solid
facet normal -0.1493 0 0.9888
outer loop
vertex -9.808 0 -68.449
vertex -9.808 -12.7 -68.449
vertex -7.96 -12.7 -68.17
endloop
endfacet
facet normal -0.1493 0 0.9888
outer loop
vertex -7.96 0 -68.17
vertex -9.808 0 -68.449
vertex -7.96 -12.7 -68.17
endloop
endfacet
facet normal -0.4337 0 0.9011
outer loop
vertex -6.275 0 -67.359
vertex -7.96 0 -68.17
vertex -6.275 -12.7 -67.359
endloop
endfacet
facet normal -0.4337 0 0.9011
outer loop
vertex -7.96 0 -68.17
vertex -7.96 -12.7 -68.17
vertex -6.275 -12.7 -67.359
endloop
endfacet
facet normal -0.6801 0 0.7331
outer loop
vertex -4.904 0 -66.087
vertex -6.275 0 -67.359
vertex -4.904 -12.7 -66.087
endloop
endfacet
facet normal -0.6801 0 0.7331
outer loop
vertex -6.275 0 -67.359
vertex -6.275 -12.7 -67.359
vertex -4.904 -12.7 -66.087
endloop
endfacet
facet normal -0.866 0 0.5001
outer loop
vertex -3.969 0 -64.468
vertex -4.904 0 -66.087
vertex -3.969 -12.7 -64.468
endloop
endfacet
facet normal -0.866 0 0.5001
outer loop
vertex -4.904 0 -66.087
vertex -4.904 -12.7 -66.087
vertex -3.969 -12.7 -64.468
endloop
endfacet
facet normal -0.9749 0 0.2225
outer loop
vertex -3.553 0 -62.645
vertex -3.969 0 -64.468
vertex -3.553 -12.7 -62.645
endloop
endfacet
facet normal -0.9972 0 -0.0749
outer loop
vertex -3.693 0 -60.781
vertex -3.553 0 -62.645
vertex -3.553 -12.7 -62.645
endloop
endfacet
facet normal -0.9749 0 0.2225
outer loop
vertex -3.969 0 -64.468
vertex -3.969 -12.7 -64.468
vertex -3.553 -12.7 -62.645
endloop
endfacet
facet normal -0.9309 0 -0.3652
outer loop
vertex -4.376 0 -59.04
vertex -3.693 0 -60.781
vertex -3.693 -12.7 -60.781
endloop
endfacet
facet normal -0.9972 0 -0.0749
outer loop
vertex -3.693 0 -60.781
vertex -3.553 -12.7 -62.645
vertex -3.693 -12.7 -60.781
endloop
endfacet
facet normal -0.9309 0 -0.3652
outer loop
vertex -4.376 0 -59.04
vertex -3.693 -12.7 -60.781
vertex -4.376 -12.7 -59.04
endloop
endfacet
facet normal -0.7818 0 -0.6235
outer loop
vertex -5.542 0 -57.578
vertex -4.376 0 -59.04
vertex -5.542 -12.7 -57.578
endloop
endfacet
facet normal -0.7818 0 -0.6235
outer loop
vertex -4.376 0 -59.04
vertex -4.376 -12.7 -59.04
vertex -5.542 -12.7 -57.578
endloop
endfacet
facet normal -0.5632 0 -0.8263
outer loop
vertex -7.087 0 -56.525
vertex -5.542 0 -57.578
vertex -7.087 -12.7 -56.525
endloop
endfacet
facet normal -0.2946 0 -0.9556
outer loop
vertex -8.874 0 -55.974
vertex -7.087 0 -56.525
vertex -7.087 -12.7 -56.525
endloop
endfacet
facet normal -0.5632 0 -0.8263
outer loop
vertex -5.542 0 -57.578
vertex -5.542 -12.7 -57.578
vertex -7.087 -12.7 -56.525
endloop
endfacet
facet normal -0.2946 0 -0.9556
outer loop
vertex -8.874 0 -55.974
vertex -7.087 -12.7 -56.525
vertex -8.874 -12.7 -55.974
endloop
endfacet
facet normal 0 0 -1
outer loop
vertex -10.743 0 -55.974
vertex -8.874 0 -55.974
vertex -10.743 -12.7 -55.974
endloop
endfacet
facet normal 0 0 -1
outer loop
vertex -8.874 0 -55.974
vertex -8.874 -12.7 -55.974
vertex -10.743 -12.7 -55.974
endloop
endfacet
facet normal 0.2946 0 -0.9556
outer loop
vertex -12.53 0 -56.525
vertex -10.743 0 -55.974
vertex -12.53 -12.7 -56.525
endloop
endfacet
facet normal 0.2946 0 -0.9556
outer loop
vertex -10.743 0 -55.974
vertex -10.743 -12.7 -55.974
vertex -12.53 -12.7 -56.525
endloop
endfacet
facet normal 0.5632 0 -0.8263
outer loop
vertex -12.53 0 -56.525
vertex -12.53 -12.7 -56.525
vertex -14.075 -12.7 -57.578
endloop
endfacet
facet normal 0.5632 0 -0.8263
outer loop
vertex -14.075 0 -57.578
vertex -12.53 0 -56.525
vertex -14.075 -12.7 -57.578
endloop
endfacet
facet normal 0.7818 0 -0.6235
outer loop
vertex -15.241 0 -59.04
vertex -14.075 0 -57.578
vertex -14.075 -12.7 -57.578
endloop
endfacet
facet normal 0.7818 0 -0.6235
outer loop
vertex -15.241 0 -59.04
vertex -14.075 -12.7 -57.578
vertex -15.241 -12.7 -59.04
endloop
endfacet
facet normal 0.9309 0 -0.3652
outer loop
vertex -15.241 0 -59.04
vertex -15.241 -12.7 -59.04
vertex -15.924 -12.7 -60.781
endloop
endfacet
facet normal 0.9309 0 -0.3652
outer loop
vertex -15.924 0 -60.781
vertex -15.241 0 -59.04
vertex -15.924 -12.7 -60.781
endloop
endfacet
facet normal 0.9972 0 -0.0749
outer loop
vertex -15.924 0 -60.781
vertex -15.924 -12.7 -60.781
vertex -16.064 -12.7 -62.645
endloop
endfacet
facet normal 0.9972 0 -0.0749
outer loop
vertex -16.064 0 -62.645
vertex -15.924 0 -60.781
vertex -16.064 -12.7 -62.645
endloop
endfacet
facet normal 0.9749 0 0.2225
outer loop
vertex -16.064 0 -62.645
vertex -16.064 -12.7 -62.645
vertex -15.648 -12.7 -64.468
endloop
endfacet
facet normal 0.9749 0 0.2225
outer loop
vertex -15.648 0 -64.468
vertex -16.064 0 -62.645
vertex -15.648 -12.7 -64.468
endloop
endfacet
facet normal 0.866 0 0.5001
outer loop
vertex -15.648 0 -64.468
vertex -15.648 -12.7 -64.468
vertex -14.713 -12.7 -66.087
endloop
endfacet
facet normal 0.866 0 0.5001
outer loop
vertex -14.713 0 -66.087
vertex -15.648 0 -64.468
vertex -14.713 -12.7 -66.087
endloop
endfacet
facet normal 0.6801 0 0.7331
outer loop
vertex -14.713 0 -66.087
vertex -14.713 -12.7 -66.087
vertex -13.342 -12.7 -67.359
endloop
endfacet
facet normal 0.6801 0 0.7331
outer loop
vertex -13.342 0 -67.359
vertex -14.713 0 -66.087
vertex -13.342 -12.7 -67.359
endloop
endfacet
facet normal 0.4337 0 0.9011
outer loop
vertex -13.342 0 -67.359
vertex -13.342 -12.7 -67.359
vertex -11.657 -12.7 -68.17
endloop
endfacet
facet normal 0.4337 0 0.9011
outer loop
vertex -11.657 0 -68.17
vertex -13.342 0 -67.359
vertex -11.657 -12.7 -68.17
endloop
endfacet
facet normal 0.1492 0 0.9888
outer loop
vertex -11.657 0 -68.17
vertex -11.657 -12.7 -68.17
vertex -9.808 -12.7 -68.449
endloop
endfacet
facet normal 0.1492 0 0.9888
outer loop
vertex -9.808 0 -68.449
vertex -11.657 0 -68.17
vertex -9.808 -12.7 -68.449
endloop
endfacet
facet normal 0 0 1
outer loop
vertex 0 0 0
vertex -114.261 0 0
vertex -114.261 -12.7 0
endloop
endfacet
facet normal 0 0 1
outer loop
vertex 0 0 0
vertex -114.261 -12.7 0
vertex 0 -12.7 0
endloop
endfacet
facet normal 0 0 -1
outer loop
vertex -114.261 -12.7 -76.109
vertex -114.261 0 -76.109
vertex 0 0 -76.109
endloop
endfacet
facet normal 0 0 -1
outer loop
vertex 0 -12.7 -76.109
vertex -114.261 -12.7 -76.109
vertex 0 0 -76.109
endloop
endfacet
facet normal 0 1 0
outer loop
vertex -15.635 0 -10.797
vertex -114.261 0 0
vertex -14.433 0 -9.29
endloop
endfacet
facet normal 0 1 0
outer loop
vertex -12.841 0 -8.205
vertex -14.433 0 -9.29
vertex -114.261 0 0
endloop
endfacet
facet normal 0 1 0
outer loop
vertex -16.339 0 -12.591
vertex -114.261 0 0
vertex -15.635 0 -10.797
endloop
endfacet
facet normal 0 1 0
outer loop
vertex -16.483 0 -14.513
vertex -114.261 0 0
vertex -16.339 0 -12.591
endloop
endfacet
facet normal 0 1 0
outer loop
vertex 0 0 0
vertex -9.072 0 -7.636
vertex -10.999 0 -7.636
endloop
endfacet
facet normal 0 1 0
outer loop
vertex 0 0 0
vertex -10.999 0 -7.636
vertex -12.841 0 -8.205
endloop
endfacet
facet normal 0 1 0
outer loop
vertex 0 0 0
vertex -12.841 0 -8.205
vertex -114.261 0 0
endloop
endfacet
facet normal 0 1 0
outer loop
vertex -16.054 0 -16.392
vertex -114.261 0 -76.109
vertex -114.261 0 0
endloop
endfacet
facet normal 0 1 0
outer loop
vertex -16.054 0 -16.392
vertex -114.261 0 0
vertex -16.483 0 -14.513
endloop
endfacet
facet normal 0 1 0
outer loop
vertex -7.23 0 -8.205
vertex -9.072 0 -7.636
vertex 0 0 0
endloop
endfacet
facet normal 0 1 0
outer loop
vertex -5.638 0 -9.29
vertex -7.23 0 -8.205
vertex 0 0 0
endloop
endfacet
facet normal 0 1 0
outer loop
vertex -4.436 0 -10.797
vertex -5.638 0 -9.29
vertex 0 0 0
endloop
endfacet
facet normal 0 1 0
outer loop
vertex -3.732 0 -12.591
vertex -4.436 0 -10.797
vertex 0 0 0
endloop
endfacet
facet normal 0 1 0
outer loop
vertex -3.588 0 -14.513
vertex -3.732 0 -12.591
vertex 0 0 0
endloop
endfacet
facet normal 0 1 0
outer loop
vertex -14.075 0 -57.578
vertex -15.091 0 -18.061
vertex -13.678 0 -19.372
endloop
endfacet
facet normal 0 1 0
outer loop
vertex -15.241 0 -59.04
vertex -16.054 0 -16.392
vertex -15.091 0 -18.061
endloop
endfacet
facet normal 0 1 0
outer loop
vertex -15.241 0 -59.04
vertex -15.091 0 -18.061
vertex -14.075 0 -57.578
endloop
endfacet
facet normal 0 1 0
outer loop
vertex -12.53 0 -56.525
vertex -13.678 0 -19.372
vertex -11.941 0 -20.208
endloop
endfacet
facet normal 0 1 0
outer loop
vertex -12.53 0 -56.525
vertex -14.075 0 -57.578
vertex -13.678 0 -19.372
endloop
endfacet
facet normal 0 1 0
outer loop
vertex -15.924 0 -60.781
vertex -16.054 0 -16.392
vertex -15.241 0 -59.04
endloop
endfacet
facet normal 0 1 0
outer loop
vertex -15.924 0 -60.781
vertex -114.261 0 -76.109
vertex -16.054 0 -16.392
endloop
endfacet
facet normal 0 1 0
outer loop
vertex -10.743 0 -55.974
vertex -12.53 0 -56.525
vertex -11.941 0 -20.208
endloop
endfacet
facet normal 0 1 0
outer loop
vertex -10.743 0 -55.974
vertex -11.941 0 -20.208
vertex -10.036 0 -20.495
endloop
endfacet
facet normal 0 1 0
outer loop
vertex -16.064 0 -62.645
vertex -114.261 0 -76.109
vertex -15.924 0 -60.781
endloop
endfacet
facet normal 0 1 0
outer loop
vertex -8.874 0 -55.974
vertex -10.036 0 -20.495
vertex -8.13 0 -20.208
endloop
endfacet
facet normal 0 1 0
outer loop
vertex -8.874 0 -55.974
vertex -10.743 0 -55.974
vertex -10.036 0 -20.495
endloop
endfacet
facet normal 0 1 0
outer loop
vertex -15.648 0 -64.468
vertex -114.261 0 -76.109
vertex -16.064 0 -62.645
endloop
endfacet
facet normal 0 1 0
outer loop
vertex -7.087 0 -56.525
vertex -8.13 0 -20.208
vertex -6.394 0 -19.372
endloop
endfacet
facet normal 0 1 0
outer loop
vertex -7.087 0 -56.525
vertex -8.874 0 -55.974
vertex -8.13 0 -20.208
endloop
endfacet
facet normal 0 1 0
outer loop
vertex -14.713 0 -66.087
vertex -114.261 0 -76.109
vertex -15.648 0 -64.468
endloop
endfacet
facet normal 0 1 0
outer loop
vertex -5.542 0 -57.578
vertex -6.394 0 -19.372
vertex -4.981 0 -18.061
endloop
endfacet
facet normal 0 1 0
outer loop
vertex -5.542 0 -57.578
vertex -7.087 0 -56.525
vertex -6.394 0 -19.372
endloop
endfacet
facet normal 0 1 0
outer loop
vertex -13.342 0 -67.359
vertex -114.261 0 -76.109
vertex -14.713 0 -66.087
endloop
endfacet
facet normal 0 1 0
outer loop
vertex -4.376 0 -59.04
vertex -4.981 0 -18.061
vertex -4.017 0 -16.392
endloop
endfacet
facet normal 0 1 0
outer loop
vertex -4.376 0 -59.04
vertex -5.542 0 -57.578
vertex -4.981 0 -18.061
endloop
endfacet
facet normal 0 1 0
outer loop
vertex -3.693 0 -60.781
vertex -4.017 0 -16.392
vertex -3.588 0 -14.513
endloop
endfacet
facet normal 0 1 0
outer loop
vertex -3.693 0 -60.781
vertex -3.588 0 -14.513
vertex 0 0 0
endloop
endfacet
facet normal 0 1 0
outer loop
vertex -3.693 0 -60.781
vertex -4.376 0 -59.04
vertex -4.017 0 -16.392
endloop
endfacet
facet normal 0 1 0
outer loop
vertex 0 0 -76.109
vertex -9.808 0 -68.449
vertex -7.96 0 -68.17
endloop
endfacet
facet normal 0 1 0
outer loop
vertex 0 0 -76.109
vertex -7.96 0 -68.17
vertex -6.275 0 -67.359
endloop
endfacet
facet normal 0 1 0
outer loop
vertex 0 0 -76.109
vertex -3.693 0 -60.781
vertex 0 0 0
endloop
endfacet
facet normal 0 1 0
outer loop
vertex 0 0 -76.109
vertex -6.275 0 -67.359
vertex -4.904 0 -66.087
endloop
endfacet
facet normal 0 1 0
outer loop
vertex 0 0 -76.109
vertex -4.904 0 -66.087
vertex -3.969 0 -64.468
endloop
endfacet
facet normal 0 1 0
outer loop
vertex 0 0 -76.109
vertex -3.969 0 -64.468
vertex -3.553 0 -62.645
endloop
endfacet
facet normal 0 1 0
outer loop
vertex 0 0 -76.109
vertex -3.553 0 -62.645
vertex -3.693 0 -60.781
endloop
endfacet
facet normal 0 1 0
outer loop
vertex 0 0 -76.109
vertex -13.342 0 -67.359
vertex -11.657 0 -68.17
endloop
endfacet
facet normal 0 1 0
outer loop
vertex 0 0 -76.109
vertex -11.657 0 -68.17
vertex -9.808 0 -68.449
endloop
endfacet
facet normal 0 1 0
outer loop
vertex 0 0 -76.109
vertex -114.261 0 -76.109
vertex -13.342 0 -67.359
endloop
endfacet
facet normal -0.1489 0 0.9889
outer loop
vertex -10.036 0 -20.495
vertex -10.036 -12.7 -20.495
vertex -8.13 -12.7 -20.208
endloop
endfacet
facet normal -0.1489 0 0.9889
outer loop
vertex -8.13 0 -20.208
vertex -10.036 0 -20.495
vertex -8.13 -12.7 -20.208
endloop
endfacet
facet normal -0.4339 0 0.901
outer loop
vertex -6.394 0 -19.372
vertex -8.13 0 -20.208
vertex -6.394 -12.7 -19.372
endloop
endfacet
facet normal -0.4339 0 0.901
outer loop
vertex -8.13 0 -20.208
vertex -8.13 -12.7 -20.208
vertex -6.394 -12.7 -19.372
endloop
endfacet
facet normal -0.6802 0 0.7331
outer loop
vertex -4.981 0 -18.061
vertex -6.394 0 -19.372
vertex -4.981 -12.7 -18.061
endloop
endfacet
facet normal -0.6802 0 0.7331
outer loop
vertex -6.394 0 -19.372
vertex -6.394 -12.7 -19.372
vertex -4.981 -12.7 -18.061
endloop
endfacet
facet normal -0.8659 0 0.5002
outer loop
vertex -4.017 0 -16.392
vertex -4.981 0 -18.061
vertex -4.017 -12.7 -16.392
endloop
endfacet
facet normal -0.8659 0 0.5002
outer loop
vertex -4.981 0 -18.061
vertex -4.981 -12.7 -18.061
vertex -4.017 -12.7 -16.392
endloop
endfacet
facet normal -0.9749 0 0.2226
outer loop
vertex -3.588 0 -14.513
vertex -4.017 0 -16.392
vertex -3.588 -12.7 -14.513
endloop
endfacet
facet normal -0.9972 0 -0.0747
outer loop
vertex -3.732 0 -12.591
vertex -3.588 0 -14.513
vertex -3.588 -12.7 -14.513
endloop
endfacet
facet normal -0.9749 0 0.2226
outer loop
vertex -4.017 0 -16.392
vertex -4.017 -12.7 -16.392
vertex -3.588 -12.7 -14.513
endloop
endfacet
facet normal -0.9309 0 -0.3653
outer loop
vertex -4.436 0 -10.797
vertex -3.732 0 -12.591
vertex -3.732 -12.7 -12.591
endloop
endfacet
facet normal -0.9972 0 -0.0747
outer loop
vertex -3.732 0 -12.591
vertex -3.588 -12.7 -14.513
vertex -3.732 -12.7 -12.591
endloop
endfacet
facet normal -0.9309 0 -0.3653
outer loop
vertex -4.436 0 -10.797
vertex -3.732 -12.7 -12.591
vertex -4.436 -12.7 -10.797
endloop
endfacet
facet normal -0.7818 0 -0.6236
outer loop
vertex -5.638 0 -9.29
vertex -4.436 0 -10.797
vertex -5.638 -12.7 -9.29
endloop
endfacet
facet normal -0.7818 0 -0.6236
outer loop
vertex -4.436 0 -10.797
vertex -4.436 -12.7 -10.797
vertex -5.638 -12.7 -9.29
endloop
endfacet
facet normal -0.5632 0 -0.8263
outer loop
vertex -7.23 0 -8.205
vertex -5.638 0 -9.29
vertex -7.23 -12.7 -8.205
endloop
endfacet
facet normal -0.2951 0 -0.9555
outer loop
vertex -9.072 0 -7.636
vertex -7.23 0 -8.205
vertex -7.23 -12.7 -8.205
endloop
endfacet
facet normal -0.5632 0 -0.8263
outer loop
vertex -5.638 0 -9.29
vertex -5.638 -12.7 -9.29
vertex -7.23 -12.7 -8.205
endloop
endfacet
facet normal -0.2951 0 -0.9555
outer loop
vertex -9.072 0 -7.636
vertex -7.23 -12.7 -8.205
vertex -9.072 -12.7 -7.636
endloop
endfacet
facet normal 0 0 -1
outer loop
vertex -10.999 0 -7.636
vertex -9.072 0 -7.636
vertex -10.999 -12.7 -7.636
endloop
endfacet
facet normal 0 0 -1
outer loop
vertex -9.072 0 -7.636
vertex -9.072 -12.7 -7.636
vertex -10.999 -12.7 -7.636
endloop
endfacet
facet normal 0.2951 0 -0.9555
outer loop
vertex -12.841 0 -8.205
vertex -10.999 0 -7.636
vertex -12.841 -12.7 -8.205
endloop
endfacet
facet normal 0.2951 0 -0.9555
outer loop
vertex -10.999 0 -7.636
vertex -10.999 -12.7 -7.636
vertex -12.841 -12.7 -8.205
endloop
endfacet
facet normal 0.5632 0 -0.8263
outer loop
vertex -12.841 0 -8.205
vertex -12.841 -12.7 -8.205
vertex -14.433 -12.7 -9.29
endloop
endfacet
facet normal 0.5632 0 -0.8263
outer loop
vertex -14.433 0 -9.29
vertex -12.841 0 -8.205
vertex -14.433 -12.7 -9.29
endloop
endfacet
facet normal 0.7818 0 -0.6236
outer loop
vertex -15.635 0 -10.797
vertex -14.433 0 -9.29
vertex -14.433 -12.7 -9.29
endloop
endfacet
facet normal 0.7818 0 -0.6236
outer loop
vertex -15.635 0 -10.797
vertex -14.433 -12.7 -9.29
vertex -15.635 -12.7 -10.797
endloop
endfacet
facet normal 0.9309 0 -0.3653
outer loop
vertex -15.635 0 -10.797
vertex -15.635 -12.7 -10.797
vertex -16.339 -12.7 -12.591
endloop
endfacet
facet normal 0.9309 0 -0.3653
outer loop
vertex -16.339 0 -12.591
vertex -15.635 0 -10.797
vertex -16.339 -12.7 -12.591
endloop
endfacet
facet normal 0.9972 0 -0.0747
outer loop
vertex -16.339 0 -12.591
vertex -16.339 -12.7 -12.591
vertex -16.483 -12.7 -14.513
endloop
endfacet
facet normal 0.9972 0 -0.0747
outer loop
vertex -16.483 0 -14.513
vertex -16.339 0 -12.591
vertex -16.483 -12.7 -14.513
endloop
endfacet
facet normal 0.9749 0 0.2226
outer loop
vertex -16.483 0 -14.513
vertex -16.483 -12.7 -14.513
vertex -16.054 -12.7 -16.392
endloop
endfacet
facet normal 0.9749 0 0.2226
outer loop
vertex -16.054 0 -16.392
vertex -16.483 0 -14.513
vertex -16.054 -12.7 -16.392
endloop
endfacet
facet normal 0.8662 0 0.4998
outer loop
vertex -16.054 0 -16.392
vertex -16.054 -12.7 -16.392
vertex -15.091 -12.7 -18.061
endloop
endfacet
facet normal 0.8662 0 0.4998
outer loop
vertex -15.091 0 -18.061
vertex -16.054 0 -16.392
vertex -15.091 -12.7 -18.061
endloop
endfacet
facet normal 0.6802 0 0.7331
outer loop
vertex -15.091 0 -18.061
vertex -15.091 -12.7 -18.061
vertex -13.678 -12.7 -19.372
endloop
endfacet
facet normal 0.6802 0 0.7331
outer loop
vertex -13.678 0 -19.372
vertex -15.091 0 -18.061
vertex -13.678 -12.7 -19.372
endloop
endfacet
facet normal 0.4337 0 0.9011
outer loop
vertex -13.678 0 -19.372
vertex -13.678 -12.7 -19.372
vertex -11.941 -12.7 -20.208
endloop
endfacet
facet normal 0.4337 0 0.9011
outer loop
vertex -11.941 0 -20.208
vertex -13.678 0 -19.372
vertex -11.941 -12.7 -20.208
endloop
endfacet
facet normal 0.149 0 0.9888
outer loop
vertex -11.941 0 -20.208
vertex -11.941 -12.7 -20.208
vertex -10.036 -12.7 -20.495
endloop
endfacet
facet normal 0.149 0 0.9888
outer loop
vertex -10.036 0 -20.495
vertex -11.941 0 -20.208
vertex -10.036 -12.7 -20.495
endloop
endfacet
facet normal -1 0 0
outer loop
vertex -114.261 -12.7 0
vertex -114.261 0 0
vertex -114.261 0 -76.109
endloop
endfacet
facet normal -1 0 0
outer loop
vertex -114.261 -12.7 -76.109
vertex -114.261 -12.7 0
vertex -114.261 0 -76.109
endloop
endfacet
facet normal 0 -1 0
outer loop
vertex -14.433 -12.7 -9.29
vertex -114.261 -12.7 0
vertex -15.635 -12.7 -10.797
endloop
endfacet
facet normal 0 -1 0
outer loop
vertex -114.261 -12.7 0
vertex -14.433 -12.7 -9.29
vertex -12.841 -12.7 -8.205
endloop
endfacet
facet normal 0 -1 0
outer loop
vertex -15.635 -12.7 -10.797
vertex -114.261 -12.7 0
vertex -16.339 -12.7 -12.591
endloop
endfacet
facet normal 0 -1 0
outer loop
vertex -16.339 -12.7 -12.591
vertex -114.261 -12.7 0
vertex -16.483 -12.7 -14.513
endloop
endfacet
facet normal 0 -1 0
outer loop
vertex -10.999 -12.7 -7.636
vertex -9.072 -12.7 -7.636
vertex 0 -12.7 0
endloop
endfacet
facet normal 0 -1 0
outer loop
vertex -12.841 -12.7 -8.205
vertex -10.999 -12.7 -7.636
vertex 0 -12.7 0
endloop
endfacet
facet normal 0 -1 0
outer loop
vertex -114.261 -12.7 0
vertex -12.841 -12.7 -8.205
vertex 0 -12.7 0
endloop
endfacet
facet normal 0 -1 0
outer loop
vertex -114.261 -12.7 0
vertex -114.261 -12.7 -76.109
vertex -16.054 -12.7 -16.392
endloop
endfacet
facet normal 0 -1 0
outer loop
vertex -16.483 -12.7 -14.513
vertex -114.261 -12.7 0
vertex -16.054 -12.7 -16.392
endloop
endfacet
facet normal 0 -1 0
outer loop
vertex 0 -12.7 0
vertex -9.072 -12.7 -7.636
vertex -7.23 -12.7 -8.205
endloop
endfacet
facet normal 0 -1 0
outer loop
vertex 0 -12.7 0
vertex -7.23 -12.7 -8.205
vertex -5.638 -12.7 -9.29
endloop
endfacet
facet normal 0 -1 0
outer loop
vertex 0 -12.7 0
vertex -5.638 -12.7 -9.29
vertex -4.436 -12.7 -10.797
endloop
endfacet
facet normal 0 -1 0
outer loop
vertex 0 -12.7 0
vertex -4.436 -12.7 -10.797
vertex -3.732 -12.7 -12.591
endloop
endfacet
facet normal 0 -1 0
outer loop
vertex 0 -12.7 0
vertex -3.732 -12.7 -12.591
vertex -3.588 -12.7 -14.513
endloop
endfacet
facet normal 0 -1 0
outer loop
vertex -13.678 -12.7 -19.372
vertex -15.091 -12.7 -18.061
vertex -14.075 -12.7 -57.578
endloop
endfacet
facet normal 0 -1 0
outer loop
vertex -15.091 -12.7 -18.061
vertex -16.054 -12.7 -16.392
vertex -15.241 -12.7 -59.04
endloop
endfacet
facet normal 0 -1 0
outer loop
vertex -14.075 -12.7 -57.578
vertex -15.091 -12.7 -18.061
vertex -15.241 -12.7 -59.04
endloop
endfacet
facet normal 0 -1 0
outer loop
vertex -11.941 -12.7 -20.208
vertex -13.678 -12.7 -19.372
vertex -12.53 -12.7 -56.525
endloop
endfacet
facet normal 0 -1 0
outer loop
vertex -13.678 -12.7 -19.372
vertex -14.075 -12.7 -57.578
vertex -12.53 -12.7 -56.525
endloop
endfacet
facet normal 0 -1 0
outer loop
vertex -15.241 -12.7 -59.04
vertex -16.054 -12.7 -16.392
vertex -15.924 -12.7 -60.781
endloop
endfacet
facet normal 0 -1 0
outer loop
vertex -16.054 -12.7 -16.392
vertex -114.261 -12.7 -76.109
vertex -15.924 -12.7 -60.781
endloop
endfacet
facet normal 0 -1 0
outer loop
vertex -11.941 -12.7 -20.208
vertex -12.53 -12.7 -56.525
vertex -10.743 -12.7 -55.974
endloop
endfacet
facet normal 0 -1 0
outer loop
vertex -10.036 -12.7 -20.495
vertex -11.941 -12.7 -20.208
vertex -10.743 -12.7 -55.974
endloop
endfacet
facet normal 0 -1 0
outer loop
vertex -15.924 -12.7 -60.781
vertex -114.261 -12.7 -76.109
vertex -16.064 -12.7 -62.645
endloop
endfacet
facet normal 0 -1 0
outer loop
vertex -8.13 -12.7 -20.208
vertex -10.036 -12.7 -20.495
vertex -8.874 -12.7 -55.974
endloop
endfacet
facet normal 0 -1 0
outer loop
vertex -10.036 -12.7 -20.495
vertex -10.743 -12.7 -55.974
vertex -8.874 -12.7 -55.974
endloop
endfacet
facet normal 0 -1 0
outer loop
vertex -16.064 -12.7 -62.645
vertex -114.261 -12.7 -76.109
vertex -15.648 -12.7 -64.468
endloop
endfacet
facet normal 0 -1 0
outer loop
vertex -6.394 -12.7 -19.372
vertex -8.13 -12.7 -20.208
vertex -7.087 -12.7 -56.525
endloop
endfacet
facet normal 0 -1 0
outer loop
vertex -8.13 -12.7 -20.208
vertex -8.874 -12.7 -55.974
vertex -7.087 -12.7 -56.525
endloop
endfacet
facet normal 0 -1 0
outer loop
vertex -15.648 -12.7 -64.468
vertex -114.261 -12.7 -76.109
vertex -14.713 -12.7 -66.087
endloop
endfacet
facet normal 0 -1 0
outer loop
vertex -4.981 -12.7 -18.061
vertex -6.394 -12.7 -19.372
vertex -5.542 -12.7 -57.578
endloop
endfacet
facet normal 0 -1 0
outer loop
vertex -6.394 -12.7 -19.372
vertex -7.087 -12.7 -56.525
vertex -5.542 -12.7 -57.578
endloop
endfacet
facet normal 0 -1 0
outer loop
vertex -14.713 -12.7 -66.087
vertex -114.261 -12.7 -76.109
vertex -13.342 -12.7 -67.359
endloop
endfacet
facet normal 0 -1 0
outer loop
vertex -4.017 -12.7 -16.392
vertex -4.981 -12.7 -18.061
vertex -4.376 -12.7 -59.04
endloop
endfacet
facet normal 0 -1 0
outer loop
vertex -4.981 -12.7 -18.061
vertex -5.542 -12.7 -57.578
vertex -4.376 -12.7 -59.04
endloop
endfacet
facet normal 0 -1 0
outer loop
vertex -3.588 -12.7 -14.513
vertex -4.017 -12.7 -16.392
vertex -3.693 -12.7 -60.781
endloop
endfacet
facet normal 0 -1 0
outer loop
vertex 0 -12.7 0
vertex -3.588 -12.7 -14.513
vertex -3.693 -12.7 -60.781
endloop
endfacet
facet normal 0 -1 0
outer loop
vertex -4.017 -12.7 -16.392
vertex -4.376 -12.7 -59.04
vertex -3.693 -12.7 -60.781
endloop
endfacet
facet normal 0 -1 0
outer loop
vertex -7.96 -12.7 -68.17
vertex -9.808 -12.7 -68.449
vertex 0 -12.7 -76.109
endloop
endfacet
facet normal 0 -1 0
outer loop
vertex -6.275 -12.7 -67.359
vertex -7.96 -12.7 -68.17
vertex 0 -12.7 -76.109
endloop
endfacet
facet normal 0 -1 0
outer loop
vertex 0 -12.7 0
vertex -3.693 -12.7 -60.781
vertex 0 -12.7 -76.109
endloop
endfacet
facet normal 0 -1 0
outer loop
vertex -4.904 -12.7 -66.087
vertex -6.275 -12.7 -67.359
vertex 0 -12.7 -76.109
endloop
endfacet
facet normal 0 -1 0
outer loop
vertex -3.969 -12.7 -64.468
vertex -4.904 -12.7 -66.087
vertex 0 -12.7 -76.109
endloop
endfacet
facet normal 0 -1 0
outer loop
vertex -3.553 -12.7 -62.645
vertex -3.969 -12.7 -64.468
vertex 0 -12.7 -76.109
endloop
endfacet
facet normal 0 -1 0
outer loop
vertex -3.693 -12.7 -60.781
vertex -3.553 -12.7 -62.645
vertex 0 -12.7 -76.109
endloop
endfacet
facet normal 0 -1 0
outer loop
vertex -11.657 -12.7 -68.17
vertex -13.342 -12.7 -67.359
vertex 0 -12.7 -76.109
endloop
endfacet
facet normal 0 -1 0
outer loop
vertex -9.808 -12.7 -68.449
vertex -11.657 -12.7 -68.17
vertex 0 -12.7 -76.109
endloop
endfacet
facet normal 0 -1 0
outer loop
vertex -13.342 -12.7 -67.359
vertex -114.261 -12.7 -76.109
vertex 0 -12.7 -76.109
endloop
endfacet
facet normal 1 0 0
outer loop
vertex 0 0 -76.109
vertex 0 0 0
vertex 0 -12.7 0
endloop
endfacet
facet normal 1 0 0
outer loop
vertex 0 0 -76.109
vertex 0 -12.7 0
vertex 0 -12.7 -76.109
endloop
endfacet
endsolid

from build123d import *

# Parameters (mm, degrees)
SKETCH1_W           = 114.261019043
SKETCH1_H           = 76.109285411
BOSS_EXTRUDE1_DEPTH = 12.7
SKETCH2_R           = 6.465438967
CUT_EXTRUDE1_DEPTH  = 28.194
SKETCH3_R           = 6.272780884
CUT_EXTRUDE2_DEPTH  = 31.242


with BuildPart() as part:
    # Sketch1 → Boss-Extrude1 (new body)
    with BuildSketch(Plane(origin=(0, 0, 0), x_dir=(1, 0, 0), z_dir=(0, 1, 0))):
        with Locations((-57.130509522, 38.054642706)):
            Rectangle(SKETCH1_W, SKETCH1_H)
    extrude(amount=-BOSS_EXTRUDE1_DEPTH)

    # Sketch2 → Cut-Extrude1 (cut)
    with BuildSketch(Plane.XZ.offset(12.7)):
        with Locations(Location((-10.03566432, -14.029659272, 0), (0, 0, 270))):
            Circle(SKETCH2_R)
    extrude(amount=-CUT_EXTRUDE1_DEPTH, mode=Mode.SUBTRACT)

    # Sketch3 → Cut-Extrude2 (cut)
    with BuildSketch(Plane.XZ.offset(12.7)):
        with Locations(Location((-9.80844034, -62.176336471, 0), (0, 0, 270))):
            Circle(SKETCH3_R)
    extrude(amount=-CUT_EXTRUDE2_DEPTH, mode=Mode.SUBTRACT)


solid = part.part
